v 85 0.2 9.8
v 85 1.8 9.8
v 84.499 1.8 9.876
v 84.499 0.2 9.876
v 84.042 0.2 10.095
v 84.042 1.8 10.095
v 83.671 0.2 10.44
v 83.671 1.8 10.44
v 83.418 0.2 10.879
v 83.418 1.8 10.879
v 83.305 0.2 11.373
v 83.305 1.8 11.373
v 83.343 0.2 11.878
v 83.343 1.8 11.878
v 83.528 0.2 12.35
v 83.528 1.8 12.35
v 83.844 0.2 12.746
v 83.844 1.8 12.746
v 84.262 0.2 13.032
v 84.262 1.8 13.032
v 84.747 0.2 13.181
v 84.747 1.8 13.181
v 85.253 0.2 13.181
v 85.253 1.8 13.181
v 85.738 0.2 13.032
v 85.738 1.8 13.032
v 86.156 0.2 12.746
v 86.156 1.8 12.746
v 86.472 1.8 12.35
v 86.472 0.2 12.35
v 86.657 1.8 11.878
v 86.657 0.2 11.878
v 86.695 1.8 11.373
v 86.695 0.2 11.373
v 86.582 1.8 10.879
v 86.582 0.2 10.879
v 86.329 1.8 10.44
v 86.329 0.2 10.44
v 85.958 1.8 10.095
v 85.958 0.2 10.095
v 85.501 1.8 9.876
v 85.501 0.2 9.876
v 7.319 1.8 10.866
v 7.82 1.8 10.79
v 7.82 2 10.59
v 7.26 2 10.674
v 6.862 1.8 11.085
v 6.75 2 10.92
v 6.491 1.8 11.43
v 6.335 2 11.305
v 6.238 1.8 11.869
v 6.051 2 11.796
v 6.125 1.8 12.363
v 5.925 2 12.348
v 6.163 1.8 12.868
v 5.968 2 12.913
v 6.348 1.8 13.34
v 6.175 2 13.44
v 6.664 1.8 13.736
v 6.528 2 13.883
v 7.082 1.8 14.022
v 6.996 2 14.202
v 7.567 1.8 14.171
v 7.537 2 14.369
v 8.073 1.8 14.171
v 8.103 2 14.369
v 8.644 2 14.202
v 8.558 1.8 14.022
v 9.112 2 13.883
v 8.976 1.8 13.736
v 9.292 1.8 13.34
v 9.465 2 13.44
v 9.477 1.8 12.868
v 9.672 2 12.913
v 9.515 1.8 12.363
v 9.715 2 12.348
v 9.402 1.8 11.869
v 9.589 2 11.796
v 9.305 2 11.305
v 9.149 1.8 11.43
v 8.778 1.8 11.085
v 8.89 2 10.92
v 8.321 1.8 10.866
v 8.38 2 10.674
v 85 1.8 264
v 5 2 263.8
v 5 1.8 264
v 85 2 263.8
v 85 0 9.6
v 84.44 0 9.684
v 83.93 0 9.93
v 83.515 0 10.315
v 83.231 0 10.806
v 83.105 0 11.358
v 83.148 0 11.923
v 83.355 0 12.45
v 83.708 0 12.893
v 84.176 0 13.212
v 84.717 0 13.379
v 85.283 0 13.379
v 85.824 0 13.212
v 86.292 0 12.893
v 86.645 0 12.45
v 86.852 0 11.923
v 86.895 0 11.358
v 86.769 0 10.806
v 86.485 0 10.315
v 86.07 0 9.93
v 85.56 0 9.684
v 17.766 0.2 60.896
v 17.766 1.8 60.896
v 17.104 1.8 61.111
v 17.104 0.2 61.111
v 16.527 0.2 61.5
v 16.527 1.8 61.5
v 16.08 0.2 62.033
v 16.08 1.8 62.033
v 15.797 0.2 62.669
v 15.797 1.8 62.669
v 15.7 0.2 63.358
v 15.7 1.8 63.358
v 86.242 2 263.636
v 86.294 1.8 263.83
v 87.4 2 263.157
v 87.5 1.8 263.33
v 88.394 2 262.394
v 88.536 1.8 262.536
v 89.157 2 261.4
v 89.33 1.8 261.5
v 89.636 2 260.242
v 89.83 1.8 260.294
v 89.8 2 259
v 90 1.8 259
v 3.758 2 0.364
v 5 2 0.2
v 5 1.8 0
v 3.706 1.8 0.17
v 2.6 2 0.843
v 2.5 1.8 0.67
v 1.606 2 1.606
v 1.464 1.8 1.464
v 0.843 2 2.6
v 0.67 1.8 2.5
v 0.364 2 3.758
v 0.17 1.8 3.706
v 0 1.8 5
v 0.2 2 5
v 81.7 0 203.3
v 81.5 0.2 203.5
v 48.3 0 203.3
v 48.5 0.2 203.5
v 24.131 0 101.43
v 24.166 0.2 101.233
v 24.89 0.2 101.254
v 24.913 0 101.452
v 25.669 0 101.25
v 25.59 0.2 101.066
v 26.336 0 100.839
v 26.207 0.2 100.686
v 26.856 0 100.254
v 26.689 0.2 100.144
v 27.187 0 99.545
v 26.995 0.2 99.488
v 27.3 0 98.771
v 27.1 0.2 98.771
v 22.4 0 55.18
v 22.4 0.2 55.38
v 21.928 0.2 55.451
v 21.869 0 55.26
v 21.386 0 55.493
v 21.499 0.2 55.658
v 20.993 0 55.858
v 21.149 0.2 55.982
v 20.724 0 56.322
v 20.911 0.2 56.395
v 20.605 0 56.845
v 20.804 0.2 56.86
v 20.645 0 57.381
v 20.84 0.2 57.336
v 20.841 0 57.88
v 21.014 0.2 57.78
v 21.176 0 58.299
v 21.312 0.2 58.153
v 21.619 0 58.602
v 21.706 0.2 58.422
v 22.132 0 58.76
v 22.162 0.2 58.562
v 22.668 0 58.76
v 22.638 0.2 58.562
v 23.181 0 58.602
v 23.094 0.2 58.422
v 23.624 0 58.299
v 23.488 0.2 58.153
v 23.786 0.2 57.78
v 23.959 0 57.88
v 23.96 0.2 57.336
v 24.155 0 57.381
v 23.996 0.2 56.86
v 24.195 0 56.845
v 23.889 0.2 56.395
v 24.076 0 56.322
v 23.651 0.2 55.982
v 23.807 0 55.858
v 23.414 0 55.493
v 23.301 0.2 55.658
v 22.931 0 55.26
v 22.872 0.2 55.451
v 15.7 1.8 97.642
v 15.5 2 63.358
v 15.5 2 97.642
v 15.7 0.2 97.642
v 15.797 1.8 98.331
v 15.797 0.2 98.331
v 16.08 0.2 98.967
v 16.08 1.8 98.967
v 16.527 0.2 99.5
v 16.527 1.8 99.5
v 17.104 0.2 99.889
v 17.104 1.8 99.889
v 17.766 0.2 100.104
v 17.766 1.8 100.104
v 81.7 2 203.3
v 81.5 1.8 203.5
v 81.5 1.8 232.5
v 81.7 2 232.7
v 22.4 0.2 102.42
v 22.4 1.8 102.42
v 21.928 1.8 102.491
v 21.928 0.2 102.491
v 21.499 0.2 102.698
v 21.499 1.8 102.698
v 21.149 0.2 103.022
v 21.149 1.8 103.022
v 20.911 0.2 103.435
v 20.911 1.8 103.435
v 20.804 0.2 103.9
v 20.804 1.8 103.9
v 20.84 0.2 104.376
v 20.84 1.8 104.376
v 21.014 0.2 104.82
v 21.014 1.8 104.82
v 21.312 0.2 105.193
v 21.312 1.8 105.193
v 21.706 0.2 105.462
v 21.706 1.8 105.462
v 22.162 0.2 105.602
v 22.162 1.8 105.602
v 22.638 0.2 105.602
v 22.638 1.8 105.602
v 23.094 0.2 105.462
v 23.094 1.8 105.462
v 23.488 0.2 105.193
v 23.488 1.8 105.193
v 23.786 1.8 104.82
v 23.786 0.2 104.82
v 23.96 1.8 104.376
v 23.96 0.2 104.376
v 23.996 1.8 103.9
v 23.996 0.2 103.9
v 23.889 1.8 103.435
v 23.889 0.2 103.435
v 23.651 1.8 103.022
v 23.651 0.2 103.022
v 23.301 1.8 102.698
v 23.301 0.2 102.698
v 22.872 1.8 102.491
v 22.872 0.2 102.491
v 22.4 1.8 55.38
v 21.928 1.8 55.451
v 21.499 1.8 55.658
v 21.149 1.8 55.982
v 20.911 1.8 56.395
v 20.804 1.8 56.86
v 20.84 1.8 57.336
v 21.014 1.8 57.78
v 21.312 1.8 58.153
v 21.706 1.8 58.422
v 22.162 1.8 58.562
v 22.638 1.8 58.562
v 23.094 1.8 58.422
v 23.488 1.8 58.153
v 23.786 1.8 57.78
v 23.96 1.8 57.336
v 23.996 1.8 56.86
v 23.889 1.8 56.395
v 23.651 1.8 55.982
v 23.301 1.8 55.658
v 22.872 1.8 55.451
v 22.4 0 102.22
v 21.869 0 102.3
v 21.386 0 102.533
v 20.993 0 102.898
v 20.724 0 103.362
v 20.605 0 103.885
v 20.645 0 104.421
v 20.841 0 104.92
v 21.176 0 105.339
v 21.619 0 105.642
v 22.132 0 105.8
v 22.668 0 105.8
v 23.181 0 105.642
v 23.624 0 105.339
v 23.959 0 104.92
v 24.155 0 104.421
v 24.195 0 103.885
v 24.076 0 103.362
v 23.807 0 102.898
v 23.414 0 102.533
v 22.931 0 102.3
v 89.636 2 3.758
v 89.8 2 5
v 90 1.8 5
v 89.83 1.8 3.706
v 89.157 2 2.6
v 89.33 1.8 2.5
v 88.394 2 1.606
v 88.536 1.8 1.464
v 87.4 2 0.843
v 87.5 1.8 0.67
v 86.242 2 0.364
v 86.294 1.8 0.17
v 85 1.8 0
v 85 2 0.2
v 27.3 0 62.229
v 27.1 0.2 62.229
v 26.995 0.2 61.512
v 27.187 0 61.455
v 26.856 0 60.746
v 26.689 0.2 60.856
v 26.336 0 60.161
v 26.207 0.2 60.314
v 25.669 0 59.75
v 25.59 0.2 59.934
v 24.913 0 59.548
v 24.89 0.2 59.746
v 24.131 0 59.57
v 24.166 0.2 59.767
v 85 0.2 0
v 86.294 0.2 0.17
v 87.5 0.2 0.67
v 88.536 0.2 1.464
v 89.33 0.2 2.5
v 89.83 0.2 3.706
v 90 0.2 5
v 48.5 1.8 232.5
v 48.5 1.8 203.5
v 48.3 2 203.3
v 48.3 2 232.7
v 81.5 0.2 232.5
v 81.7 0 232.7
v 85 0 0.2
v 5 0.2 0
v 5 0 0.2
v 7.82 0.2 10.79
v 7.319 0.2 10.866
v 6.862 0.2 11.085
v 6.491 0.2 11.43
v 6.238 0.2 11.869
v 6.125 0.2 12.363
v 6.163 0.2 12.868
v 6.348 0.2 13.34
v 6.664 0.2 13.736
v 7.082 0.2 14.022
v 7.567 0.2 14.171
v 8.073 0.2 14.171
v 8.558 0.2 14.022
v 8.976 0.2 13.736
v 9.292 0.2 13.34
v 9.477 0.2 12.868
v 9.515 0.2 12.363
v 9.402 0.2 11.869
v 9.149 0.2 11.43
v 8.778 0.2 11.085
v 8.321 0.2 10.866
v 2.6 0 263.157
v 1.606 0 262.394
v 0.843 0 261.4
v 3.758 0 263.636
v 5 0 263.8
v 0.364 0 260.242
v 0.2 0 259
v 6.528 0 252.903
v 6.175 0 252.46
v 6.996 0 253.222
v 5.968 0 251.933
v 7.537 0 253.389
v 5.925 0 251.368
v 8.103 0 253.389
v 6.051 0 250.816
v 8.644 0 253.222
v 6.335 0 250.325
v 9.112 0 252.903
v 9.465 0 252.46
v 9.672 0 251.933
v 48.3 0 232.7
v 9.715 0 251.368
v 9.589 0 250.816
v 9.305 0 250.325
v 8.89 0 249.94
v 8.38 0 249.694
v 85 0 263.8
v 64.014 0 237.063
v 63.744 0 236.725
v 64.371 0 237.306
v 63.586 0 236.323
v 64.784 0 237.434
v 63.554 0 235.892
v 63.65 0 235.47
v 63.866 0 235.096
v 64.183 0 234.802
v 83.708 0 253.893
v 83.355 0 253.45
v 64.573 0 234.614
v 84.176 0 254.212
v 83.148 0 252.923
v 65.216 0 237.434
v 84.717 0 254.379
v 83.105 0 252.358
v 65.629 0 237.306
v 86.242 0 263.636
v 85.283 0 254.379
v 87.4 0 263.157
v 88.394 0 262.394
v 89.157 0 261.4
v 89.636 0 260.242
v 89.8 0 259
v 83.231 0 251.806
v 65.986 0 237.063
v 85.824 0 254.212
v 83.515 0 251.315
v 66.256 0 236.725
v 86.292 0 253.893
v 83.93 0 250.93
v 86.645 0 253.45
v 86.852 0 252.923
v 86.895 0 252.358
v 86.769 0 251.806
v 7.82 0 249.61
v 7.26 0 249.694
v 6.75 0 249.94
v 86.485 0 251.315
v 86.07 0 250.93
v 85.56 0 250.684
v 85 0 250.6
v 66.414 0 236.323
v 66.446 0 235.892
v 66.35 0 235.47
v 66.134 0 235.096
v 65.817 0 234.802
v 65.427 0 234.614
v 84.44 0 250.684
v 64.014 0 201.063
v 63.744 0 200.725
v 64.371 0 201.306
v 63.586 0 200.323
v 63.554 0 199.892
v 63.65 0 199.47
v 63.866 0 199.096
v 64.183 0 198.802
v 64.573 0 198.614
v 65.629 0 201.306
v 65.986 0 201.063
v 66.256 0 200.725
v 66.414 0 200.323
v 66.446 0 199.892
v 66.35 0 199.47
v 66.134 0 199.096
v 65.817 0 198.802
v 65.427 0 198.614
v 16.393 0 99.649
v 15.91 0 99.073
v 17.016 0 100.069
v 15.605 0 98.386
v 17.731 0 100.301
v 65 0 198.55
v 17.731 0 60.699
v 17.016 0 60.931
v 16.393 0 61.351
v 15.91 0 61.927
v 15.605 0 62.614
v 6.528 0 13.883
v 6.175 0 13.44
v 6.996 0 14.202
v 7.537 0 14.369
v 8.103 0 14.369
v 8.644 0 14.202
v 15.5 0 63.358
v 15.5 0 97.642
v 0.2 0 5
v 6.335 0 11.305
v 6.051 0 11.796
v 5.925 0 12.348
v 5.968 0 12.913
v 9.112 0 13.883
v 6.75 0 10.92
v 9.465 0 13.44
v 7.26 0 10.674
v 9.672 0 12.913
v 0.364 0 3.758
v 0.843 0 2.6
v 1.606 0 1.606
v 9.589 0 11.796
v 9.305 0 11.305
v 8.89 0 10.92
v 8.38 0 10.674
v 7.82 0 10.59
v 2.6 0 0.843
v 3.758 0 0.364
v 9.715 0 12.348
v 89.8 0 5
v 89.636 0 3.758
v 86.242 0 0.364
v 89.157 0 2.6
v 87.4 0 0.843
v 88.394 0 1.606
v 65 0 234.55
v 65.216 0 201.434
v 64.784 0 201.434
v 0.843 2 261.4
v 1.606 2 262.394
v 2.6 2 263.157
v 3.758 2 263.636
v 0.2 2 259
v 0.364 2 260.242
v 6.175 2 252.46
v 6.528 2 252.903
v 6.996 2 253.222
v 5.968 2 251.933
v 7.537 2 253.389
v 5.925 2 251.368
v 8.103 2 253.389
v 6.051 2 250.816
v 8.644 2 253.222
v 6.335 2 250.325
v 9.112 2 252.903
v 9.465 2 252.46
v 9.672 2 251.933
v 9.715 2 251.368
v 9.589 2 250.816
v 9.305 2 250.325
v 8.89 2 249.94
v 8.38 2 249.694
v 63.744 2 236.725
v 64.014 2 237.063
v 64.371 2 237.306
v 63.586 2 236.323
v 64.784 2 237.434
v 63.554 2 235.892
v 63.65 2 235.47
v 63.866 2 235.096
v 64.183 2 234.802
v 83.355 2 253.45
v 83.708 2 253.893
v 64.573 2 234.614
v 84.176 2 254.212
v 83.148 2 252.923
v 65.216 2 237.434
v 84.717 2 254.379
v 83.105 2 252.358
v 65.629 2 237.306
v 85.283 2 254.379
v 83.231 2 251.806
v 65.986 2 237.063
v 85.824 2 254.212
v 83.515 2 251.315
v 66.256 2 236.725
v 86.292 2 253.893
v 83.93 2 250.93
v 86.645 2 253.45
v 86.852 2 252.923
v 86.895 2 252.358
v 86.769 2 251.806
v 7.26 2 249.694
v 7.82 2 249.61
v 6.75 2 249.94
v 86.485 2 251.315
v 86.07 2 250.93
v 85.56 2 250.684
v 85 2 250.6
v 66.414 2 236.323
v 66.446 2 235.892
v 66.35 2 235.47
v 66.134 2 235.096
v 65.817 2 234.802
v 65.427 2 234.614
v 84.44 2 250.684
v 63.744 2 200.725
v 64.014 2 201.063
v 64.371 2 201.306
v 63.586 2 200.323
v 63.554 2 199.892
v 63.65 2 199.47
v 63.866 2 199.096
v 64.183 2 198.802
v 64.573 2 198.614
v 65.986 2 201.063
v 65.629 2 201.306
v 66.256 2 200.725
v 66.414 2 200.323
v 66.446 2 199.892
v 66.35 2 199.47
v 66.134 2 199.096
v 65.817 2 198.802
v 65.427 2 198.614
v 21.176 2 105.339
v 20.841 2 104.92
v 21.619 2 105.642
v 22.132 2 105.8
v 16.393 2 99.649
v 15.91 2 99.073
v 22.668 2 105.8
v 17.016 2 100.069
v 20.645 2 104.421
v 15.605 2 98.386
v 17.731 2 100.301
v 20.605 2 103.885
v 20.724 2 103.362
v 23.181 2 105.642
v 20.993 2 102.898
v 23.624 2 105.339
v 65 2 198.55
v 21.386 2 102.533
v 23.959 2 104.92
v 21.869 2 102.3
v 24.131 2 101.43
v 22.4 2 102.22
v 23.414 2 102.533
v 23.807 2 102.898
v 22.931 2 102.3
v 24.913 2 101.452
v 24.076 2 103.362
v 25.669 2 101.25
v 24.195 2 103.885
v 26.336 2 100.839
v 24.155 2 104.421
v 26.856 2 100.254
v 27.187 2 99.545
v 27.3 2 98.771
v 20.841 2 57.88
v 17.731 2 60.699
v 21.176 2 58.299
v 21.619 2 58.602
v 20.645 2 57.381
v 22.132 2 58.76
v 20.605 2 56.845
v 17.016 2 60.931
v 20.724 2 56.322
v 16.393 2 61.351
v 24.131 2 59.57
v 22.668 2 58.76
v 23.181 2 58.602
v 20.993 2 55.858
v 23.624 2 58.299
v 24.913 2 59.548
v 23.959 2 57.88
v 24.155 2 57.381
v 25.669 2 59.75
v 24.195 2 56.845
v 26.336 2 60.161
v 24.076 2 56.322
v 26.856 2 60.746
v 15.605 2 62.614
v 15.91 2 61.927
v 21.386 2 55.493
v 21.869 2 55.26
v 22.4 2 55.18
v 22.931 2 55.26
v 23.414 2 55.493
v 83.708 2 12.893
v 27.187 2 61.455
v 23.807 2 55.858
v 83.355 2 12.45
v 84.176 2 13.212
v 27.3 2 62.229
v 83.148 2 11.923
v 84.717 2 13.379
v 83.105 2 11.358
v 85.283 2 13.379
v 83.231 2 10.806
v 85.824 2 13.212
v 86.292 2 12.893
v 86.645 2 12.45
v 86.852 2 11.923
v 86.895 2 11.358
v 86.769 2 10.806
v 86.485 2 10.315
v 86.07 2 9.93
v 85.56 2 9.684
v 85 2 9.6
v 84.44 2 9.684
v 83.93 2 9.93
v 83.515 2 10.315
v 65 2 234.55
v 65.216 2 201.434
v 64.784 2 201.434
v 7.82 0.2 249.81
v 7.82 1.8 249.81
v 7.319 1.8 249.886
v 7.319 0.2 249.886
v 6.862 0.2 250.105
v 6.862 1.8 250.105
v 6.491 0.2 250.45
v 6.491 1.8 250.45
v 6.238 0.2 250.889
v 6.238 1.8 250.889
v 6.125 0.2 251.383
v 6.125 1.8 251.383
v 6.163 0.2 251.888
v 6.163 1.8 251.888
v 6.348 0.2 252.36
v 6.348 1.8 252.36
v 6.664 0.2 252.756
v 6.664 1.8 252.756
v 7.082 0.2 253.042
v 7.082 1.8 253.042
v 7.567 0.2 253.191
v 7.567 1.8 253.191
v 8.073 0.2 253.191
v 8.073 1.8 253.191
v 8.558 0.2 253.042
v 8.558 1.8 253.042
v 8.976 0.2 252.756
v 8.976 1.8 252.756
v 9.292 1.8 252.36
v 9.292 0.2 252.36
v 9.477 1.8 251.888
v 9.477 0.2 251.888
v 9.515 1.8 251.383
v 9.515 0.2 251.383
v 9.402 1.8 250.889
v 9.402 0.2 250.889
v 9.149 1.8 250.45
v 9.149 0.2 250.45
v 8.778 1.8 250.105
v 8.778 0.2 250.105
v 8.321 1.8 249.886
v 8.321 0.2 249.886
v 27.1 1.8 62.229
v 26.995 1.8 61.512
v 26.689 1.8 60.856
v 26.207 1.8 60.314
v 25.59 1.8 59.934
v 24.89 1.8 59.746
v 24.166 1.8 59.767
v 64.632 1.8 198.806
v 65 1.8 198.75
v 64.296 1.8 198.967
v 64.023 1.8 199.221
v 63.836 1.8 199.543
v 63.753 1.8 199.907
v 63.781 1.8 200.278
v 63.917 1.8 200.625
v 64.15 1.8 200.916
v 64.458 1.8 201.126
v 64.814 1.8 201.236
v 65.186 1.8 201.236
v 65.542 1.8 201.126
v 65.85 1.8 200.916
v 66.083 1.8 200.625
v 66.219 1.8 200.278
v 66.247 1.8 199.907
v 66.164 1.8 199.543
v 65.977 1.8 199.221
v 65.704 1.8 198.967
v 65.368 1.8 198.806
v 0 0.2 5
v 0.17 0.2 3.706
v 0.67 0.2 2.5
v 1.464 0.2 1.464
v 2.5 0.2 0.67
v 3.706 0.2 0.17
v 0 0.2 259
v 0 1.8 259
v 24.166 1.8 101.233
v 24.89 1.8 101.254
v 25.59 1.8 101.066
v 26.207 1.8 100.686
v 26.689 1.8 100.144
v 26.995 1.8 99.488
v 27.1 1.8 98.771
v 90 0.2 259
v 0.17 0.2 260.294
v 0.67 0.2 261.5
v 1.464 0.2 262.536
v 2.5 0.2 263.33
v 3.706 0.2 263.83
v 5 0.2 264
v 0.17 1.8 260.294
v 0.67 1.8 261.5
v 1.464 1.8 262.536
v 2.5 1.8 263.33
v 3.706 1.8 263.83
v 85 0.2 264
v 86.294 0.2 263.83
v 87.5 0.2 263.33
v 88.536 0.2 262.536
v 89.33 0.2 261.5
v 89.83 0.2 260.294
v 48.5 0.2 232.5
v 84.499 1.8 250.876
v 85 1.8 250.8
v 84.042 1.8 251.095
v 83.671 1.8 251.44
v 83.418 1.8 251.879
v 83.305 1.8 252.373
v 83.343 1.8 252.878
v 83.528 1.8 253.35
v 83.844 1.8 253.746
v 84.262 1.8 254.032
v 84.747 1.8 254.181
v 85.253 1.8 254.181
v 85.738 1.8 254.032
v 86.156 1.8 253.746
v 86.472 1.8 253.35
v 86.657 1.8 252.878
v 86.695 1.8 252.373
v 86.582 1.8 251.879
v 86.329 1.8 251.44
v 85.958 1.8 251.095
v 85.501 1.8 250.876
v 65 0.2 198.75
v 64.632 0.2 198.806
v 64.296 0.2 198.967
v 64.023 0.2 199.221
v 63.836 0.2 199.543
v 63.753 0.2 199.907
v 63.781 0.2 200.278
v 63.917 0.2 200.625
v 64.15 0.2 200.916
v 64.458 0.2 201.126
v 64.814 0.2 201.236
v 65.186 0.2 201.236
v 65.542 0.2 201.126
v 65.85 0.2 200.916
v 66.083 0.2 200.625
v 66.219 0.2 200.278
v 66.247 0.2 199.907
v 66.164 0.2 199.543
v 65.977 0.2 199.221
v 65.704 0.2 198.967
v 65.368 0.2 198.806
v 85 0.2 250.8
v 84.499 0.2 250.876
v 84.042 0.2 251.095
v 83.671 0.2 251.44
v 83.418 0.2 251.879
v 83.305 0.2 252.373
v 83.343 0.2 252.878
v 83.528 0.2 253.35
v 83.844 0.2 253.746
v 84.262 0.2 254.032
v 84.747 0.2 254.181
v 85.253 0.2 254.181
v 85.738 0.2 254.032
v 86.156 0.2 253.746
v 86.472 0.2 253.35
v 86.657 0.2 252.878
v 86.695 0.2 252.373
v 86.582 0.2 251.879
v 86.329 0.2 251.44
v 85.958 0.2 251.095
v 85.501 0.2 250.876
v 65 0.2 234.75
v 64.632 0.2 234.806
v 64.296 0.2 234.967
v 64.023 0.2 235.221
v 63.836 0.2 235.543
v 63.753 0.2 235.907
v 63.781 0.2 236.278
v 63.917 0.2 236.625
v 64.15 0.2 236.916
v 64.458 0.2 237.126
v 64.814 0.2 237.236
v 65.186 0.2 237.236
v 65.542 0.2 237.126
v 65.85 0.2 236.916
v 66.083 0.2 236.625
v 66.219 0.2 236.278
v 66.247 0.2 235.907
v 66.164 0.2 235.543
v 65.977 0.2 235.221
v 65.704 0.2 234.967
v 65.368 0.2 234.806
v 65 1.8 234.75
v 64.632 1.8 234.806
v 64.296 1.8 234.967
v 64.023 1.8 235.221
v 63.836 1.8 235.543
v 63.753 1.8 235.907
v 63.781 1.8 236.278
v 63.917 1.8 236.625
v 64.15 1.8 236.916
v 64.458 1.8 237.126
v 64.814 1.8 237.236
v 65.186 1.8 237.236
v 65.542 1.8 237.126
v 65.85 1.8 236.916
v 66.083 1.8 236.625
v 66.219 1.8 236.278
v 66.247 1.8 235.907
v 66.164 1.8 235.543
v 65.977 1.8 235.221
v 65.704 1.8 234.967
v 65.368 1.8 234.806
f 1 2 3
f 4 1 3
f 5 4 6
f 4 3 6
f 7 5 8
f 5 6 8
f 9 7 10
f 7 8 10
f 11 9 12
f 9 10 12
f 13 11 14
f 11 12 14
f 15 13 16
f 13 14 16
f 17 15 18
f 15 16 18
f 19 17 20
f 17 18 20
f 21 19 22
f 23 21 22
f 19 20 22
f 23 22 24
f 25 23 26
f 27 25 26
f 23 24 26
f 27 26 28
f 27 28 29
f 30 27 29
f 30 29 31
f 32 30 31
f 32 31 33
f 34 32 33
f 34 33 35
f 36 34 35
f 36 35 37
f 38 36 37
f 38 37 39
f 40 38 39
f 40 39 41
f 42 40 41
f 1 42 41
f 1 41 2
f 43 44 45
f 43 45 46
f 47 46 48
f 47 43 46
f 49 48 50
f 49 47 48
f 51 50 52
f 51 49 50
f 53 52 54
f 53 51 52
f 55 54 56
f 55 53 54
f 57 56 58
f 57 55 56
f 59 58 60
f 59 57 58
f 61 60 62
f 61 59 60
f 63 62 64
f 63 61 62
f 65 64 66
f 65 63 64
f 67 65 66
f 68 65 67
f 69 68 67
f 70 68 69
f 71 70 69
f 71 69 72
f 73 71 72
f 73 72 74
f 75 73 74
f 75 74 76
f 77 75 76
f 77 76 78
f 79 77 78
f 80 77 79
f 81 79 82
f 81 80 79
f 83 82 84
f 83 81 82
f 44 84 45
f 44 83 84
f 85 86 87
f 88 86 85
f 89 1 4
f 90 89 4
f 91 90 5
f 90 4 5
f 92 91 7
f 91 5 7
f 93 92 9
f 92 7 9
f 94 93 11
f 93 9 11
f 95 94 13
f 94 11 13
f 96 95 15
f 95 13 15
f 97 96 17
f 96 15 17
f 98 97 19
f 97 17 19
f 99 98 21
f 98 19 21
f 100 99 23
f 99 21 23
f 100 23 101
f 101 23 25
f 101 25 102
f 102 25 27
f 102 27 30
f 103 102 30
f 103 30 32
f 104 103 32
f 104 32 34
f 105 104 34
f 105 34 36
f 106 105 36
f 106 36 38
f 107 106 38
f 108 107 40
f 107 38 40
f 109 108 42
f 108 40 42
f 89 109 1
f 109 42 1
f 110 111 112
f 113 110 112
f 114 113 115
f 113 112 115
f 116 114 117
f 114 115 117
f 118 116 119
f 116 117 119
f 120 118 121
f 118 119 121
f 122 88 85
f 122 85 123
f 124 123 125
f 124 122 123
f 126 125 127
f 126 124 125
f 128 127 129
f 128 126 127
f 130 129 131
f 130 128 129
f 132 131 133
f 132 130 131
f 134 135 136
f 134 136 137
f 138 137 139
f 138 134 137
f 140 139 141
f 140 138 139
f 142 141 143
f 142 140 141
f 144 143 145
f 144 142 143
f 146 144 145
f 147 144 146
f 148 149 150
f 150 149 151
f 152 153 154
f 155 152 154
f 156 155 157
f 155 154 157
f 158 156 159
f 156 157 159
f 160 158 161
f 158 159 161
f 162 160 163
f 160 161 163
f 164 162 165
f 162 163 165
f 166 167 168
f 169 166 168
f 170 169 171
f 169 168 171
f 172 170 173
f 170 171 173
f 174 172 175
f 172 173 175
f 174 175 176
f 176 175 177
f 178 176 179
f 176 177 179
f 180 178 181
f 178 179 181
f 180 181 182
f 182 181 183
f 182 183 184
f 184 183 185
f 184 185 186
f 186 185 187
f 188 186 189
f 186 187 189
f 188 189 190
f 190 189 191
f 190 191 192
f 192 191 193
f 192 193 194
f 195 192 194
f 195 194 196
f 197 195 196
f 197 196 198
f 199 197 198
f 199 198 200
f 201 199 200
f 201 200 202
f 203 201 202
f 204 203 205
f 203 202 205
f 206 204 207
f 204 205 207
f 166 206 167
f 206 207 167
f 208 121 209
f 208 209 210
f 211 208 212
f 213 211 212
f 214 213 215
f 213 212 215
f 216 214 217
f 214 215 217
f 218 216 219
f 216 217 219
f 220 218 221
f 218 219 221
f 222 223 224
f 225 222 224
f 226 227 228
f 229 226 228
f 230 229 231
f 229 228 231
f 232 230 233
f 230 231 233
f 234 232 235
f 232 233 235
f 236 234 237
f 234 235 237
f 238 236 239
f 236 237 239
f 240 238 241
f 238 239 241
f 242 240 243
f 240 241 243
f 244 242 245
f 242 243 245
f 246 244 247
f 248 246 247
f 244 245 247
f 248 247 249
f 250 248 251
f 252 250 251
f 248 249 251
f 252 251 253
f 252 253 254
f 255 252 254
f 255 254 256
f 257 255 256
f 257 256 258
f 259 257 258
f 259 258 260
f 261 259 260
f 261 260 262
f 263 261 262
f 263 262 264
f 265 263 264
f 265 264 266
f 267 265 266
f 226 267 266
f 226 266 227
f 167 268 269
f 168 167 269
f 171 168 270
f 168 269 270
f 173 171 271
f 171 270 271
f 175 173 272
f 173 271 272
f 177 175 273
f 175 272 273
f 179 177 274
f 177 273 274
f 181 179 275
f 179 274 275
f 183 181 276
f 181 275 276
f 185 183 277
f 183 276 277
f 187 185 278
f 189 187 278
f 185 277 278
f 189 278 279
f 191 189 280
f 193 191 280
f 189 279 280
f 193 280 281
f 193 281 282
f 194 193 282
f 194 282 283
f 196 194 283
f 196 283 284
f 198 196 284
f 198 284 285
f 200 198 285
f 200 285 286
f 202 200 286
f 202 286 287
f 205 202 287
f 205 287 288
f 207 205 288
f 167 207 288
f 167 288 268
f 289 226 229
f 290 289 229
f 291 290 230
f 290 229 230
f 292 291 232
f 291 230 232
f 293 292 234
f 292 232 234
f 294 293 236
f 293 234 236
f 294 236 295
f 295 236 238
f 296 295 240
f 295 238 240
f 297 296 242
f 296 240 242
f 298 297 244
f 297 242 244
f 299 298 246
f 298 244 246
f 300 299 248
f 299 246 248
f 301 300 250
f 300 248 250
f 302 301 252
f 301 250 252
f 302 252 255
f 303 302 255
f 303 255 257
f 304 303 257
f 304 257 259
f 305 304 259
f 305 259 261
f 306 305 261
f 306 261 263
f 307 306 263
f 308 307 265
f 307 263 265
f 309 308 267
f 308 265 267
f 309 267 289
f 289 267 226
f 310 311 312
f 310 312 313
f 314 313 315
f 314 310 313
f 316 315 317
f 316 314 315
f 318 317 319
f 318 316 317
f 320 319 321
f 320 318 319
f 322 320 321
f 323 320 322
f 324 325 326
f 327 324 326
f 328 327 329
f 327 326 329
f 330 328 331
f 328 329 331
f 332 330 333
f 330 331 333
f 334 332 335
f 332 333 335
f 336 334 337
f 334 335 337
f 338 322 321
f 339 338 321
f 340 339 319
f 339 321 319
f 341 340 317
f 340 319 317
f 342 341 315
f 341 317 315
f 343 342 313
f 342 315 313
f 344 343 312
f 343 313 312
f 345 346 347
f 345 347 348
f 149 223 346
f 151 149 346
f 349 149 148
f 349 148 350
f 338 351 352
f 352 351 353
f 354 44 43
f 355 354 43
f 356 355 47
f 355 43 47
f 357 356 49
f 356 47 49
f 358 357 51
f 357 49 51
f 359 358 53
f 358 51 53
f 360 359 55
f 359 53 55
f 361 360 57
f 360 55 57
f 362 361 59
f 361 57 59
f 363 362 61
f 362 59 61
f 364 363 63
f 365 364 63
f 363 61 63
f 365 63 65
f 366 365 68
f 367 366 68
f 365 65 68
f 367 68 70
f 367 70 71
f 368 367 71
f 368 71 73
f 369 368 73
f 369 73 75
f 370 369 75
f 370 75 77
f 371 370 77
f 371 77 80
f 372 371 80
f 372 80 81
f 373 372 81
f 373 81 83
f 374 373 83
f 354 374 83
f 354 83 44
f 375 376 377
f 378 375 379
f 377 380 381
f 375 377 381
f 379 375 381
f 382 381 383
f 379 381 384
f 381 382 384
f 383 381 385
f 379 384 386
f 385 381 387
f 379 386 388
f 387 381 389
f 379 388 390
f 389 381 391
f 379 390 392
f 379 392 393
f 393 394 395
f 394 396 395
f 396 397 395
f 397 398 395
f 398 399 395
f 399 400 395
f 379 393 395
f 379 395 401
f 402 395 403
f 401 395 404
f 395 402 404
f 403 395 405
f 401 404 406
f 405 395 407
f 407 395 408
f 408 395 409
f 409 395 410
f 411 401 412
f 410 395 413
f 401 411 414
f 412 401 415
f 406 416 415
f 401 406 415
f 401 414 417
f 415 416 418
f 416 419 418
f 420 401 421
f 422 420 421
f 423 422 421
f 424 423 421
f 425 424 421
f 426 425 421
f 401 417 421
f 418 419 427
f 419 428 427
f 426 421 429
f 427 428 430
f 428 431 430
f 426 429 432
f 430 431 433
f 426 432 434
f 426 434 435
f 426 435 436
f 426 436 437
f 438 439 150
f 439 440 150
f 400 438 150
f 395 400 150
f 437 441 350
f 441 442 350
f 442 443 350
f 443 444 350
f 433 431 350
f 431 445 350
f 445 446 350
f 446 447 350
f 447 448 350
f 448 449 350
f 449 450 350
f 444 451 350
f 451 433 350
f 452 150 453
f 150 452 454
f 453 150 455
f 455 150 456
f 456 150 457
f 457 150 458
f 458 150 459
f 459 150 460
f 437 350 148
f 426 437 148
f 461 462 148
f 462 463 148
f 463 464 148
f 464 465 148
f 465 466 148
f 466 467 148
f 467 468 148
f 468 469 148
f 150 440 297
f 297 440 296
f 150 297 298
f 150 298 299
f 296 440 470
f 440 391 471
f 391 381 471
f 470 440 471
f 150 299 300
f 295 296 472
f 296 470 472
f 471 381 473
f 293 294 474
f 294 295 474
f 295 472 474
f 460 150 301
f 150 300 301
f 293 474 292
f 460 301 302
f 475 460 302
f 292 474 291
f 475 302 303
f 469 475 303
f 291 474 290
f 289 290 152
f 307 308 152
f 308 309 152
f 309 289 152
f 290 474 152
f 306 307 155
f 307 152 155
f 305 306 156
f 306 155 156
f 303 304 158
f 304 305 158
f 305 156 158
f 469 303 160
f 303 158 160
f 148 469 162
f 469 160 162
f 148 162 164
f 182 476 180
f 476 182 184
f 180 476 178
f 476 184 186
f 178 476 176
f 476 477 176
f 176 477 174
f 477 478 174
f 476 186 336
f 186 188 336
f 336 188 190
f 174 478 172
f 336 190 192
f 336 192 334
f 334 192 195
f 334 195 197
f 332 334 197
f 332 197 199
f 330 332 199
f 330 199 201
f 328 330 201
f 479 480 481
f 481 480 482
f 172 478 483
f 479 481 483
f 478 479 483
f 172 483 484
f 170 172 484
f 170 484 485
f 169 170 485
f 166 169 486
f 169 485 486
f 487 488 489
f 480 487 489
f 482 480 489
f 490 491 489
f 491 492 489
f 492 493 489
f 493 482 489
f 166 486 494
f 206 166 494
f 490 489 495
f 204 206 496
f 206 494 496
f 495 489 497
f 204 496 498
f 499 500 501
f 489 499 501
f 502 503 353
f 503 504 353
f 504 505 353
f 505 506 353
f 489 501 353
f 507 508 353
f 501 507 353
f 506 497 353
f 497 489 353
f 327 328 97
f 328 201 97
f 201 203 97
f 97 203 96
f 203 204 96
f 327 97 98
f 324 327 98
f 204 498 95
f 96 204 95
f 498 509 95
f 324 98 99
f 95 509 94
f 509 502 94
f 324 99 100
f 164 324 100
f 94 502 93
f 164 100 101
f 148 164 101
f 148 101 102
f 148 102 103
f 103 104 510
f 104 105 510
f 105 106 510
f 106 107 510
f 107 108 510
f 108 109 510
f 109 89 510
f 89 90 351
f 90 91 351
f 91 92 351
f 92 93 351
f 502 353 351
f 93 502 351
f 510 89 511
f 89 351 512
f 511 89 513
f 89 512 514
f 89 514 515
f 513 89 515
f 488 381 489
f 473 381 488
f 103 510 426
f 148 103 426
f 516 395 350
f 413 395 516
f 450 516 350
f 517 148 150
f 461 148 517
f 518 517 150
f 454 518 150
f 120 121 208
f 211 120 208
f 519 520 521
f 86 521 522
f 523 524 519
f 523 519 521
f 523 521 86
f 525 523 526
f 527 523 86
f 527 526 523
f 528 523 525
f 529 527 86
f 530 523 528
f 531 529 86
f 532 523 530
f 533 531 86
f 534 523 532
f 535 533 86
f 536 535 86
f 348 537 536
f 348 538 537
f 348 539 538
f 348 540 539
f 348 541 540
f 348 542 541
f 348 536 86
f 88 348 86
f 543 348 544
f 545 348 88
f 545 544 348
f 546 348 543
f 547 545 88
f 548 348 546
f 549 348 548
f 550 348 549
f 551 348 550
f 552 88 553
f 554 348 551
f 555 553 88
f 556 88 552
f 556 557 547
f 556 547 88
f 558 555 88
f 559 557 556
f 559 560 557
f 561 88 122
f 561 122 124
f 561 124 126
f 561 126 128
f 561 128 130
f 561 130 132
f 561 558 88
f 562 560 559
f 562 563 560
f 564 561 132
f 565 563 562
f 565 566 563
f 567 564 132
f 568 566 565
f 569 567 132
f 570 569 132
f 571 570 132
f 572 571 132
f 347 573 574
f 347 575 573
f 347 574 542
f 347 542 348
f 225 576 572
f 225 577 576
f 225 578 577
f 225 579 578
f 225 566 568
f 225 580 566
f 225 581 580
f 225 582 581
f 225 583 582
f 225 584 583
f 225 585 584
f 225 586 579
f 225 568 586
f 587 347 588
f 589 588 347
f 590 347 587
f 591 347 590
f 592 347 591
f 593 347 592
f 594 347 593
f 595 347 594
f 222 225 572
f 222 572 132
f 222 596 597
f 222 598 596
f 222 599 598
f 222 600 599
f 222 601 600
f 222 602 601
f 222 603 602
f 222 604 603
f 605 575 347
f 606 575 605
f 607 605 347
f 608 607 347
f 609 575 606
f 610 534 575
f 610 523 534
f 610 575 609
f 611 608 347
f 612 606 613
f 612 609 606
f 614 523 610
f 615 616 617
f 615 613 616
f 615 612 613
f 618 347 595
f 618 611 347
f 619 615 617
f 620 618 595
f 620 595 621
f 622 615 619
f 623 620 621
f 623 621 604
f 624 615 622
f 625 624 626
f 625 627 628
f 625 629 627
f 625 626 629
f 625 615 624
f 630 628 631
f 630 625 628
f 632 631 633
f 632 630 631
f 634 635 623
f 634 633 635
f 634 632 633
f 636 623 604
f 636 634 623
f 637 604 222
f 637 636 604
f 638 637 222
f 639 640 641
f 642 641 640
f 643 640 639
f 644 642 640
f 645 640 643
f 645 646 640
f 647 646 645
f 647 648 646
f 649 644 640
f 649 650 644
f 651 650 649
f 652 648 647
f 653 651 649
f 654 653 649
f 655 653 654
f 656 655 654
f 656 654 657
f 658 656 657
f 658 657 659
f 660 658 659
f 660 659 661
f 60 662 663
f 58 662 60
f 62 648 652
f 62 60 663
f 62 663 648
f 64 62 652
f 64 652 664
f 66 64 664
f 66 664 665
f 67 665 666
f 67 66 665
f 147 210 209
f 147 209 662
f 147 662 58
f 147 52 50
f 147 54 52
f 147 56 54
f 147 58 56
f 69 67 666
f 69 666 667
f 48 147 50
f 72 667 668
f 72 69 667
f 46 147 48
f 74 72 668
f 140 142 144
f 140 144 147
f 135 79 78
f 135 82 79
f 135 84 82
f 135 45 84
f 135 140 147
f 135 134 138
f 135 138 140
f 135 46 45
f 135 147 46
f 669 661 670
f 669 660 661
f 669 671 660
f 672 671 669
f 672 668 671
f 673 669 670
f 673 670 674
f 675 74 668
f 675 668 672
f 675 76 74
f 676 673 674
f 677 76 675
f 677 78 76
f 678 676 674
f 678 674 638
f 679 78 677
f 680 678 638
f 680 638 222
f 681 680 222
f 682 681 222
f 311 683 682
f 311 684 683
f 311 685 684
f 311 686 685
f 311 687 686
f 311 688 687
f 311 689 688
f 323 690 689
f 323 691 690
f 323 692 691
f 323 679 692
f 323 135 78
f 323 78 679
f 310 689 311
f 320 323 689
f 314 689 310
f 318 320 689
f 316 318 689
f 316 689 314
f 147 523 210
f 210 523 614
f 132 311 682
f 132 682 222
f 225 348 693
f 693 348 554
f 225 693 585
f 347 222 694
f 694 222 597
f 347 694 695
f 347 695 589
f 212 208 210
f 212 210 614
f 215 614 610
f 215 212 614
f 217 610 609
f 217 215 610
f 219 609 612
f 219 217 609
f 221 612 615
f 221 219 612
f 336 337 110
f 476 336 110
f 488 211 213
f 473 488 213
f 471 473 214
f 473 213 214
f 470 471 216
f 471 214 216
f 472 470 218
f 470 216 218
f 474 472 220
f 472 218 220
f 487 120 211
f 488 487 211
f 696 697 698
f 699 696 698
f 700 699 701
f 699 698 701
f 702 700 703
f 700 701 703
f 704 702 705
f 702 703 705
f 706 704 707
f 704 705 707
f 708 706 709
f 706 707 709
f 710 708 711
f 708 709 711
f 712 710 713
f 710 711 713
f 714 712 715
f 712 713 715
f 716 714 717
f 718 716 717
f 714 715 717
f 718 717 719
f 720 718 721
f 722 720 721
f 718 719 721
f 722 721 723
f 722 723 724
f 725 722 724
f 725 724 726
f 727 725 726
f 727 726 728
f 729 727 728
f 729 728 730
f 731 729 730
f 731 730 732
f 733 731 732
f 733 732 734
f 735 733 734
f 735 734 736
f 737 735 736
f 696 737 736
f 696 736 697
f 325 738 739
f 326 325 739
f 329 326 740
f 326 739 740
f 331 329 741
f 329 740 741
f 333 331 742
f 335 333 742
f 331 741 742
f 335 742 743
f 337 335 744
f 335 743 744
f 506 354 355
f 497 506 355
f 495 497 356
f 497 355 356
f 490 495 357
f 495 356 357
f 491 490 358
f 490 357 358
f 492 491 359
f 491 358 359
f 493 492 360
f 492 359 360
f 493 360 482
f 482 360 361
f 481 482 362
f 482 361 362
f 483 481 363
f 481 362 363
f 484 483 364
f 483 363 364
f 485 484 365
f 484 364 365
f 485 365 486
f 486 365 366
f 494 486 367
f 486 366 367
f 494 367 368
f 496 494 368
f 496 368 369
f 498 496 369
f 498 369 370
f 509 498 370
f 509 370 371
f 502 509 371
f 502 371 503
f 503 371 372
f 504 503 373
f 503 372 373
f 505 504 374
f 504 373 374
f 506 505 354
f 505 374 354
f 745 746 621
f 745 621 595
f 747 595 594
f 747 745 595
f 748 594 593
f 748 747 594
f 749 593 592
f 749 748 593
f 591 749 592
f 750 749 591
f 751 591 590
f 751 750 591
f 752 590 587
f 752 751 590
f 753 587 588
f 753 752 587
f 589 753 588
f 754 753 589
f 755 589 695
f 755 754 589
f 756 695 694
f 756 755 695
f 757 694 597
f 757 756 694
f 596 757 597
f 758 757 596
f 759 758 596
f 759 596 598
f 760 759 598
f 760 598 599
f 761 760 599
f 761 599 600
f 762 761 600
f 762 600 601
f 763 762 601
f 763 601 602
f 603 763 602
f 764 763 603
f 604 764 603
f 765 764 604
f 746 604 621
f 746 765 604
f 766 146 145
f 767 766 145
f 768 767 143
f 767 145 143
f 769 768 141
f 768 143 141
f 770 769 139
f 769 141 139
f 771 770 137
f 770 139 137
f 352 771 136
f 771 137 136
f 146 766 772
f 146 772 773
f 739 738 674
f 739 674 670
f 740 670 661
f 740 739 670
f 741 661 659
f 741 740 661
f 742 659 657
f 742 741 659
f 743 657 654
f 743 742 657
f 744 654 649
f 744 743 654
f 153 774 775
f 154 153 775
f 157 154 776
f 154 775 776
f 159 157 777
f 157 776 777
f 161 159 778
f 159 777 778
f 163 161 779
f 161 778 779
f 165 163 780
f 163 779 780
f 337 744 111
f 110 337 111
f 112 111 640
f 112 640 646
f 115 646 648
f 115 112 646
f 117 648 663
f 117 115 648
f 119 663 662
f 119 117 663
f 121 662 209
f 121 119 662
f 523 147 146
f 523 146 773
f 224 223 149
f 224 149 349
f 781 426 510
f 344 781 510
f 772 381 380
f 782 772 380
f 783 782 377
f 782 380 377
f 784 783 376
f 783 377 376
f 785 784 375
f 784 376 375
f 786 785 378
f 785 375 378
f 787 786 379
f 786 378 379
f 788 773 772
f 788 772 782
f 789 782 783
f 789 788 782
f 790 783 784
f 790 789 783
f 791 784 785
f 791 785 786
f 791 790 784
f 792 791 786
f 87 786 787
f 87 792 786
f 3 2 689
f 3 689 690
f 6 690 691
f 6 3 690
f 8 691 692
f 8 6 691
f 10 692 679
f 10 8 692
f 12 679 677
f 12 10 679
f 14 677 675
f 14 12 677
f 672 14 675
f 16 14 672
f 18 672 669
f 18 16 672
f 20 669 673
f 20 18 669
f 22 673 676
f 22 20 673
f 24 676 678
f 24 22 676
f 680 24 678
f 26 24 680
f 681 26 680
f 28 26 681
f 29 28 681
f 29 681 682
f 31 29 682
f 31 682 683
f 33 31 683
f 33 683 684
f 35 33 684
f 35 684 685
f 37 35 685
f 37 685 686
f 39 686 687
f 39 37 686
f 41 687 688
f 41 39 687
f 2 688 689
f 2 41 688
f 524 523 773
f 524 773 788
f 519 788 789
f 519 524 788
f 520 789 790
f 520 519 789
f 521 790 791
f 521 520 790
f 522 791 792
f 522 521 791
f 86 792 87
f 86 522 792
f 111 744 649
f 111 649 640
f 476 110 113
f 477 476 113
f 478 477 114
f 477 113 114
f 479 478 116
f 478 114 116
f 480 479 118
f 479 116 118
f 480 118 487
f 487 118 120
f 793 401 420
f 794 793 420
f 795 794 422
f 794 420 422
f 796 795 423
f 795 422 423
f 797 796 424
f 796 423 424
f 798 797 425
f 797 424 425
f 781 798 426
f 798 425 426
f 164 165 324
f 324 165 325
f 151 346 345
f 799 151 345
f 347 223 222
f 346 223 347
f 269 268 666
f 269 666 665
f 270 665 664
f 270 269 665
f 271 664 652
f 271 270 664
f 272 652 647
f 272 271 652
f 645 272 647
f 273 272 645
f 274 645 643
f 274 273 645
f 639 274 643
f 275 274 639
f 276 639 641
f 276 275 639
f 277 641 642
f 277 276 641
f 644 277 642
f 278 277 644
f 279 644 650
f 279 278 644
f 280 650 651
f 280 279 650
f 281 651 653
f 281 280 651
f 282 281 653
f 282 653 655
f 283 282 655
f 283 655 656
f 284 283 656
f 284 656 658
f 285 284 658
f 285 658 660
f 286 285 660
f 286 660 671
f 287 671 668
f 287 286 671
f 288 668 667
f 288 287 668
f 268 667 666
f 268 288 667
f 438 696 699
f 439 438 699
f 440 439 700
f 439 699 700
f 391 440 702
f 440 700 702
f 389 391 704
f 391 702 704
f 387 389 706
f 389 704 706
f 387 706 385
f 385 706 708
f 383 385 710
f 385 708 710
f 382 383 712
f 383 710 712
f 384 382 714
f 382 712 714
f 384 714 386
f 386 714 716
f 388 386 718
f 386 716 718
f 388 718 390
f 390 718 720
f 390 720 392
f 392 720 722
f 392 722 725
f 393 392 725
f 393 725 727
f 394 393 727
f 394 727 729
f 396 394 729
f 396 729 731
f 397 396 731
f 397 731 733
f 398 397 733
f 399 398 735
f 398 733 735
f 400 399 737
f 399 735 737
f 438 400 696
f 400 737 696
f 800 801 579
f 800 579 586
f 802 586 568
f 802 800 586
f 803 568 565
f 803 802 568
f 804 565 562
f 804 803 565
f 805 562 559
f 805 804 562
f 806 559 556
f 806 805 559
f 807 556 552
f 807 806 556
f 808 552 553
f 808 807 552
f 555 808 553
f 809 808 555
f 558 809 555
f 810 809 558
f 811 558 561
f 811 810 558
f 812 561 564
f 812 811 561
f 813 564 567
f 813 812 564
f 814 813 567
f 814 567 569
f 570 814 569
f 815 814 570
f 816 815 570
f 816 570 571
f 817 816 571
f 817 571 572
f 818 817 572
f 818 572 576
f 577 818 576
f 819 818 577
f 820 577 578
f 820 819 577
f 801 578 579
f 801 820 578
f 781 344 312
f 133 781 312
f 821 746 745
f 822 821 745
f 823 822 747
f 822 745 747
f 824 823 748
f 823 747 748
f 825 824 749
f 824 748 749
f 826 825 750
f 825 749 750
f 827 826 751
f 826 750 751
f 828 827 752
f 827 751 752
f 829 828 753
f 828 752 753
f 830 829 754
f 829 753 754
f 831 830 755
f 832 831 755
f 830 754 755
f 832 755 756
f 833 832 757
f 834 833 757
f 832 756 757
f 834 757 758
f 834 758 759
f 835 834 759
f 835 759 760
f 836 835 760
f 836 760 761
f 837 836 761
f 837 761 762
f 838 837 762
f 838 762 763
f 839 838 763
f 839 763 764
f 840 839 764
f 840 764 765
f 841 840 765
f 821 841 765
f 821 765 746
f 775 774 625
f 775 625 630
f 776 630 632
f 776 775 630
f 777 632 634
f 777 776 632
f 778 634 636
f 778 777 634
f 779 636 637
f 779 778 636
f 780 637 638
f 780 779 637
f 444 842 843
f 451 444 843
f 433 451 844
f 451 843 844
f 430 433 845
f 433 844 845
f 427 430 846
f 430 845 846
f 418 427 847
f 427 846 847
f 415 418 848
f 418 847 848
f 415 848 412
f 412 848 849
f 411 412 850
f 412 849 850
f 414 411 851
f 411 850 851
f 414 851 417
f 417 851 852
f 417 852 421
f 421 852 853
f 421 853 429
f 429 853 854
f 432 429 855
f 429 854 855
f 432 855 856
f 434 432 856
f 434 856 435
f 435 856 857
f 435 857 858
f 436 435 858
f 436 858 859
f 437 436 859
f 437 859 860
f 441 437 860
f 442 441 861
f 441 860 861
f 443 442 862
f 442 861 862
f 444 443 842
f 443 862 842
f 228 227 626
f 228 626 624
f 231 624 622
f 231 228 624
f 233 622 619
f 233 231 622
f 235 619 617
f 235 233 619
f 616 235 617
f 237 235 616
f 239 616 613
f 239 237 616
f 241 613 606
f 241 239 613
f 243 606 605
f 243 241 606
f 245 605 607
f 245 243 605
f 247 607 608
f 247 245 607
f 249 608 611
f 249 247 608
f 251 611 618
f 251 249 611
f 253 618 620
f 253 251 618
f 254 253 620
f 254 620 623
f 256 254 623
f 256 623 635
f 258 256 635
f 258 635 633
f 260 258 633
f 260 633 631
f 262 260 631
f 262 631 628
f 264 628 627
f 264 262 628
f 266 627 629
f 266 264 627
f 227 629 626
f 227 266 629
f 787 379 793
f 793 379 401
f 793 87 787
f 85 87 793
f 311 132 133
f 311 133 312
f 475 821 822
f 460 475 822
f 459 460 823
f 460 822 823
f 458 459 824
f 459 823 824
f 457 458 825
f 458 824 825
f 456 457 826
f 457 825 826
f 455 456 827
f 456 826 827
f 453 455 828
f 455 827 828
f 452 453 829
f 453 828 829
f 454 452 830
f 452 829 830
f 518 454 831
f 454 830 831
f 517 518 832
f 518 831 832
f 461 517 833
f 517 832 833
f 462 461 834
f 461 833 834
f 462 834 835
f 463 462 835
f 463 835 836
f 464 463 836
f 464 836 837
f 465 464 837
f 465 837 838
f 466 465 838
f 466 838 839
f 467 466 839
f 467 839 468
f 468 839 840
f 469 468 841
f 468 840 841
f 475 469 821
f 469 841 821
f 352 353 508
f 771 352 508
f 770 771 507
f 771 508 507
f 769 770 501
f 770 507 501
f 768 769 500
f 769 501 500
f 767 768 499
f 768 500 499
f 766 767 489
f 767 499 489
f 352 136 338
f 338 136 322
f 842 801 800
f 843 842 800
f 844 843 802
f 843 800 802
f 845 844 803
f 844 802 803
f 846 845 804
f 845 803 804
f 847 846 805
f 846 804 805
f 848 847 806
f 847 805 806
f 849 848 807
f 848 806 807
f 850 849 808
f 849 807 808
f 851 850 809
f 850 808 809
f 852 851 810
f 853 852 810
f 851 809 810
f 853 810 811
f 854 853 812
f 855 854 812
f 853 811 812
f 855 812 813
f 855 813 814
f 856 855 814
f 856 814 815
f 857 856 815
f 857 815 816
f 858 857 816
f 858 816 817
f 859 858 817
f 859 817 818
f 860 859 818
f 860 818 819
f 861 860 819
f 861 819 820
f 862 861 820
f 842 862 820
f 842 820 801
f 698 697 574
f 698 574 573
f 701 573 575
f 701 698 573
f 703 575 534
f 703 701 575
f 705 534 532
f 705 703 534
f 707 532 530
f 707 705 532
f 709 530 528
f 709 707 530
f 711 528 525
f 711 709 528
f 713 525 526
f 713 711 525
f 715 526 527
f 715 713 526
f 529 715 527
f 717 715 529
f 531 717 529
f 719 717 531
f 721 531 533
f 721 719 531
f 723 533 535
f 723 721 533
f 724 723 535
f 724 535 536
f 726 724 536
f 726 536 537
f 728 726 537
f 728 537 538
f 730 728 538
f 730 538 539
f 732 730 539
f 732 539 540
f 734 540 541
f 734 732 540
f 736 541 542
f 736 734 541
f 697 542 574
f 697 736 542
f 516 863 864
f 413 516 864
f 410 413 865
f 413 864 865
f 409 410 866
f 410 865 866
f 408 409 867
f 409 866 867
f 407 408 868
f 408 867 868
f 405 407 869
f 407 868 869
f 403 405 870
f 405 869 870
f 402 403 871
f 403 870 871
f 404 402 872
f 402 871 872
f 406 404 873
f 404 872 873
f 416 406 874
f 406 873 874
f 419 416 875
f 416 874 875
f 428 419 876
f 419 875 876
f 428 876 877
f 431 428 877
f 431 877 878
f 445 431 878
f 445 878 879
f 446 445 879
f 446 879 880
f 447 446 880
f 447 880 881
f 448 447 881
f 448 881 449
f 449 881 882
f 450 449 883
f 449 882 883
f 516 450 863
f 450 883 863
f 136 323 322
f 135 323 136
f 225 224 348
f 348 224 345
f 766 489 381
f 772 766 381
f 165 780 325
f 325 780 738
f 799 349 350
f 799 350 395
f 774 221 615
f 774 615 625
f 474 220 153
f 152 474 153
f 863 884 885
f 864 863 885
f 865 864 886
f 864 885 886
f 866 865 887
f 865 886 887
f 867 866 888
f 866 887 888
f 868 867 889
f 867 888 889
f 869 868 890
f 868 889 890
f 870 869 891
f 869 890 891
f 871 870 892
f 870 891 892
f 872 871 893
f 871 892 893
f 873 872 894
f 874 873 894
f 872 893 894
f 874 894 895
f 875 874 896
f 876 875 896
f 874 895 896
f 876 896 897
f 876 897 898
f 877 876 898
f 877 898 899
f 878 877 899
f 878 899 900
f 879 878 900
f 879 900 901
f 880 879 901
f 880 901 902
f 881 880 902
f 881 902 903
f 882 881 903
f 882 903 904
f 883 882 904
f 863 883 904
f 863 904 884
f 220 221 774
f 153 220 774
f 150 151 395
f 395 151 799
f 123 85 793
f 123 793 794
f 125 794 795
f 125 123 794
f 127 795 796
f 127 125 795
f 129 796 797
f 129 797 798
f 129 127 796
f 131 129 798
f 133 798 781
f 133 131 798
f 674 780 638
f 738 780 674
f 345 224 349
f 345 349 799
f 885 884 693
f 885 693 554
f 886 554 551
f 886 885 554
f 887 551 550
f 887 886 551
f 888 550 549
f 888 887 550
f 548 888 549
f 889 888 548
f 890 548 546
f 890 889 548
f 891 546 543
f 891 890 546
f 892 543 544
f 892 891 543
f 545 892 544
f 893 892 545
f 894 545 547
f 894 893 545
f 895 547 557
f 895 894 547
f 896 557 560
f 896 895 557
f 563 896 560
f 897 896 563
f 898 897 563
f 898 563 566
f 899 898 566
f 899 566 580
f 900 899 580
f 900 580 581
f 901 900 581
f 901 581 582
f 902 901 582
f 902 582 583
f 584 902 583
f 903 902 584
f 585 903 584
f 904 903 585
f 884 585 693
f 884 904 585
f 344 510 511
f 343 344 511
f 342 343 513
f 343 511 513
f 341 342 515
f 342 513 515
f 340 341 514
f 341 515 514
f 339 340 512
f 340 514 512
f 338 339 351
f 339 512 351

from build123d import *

# Parameters (mm, degrees)
ESQUISSE1_W             = 90
ESQUISSE1_H             = 2
BASE_EXTRUSION_DEPTH    = 264
ESQUISSE2_W             = 33
ESQUISSE2_H             = 29
ENL_V_MAT_EXTRU_1_DEPTH = 279.92651362
ENL_V_MAT_EXTRU_2_DEPTH = 279.92651362
ESQUISSE4_R             = 1.6
ESQUISSE4_R_2           = 1.7
ESQUISSE4_R_3           = 1.25
ENL_V_MAT_EXTRU_3_DEPTH = 279.92651362
CONG_1_R                = 5
CHANFREIN1_SIZE         = 0.2


with BuildPart() as part:
    # Esquisse1 → Base-Extrusion (new body)
    with BuildSketch(Plane.XY):
        with Locations((45, 1)):
            Rectangle(ESQUISSE1_W, ESQUISSE1_H)
    extrude(amount=BASE_EXTRUSION_DEPTH)

    # Esquisse2 → Enlèv. mat.-Extru.1 (cut, through all)
    with BuildSketch(Plane(origin=(0, 2, 0), x_dir=(-1, 0, 0), z_dir=(0, 1, 0))):
        with Locations((-65, 218)):
            Rectangle(ESQUISSE2_W, ESQUISSE2_H)
    extrude(amount=-ENL_V_MAT_EXTRU_1_DEPTH, mode=Mode.SUBTRACT)

    # Esquisse3 → Enlèv. mat.-Extru.2 (cut, through all)
    with BuildSketch(Plane(origin=(0, 2, 0), x_dir=(-1, 0, 0), z_dir=(0, 1, 0))):
        with BuildLine():
            Line((-27.1, 98.770616019), (-27.1, 62.229383981))
            ThreePointArc((-27.1, 62.229383981), (-26.206969024, 60.314272874), (-24.165879556, 59.767364599))
            Line((-24.165879556, 59.767364599), (-17.765879556, 60.895857275))
            ThreePointArc((-17.765879556, 60.895857275), (-16.284888892, 61.750907634), (-15.7, 63.357876658))
            Line((-15.7, 63.357876658), (-15.7, 97.642123342))
            ThreePointArc((-15.7, 97.642123342), (-16.284888892, 99.249092366), (-17.765879556, 100.104142725))
            Line((-17.765879556, 100.104142725), (-24.165879556, 101.232635401))
            ThreePointArc((-24.165879556, 101.232635401), (-26.206969024, 100.685727126), (-27.1, 98.770616019))
        make_face()
    extrude(amount=-ENL_V_MAT_EXTRU_2_DEPTH, mode=Mode.SUBTRACT)

    # Esquisse4 → Enlèv. mat.-Extru.3 (cut, through all)
    with BuildSketch(Plane(origin=(0, 2, 0), x_dir=(-1, 0, 0), z_dir=(0, 1, 0))):
        with Locations(Location((-22.4, 104.02, 0), (0, 0, 270))):
            Circle(ESQUISSE4_R)
        with Locations(Location((-22.4, 56.98, 0), (0, 0, 270))):
            Circle(ESQUISSE4_R)
        with Locations(Location((-85, 252.5, 0), (0, 0, 270))):
            Circle(ESQUISSE4_R_2)
        with Locations(Location((-85, 11.5, 0), (0, 0, 270))):
            Circle(ESQUISSE4_R_2)
        with Locations(Location((-7.82, 12.49, 0), (0, 0, 270))):
            Circle(ESQUISSE4_R_2)
        with Locations(Location((-7.82, 251.51, 0), (0, 0, 270))):
            Circle(ESQUISSE4_R_2)
        with Locations(Location((-65, 236, 0), (0, 0, 270))):
            Circle(ESQUISSE4_R_3)
        with Locations(Location((-65, 200, 0), (0, 0, 270))):
            Circle(ESQUISSE4_R_3)
    extrude(amount=-ENL_V_MAT_EXTRU_3_DEPTH, mode=Mode.SUBTRACT)

    # Congé1
    cong_1_edges = [part.edges().sort_by_distance(p)[0] for p in [
        (0, 1, 0),
        (0, 1, 264),
        (90, 1, 0),
        (90, 1, 264),
    ]]
    fillet(cong_1_edges, radius=CONG_1_R)

    # Chanfrein1
    chanfrein1_edges = [part.edges().sort_by_distance(p)[0] for p in [
        (0, 0, 132),
        (1.464466094, 0, 1.464466094),
        (1.464466094, 0, 262.535533906),
        (45, 0, 0),
        (45, 0, 264),
        (88.535533906, 0, 1.464466094),
        (88.535533906, 0, 262.535533906),
        (90, 0, 132),
        (7.82, 0, 253.21),
        (65, 0, 237.25),
        (81.5, 0, 218),
        (65, 0, 203.5),
        (65, 0, 232.5),
        (48.5, 0, 218),
        (65, 0, 201.25),
        (85, 0, 254.2),
        (22.4, 0, 105.62),
        (27.1, 0, 80.5),
        (26.206969024, 0, 100.685727126),
        (26.206969024, 0, 60.314272874),
        (20.965879556, 0, 100.668389063),
        (20.965879556, 0, 60.331610937),
        (16.284888892, 0, 99.249092366),
        (16.284888892, 0, 61.750907634),
        (15.7, 0, 80.5),
        (22.4, 0, 58.58),
        (7.82, 0, 14.19),
        (85, 0, 13.2),
        (0, 2, 132),
        (1.464466094, 2, 1.464466094),
        (1.464466094, 2, 262.535533906),
        (45, 2, 0),
        (45, 2, 264),
        (88.535533906, 2, 1.464466094),
        (88.535533906, 2, 262.535533906),
        (90, 2, 132),
        (7.82, 2, 253.21),
        (65, 2, 237.25),
        (81.5, 2, 218),
        (65, 2, 203.5),
        (65, 2, 232.5),
        (48.5, 2, 218),
        (65, 2, 201.25),
        (85, 2, 254.2),
        (22.4, 2, 105.62),
        (27.1, 2, 80.5),
        (26.206969024, 2, 100.685727126),
        (26.206969024, 2, 60.314272874),
        (20.965879556, 2, 100.668389063),
        (20.965879556, 2, 60.331610937),
        (16.284888892, 2, 99.249092366),
        (16.284888892, 2, 61.750907634),
        (15.7, 2, 80.5),
        (22.4, 2, 58.58),
        (7.82, 2, 14.19),
        (85, 2, 13.2),
    ]]
    chamfer(chanfrein1_edges, length=CHANFREIN1_SIZE)


solid = part.part
